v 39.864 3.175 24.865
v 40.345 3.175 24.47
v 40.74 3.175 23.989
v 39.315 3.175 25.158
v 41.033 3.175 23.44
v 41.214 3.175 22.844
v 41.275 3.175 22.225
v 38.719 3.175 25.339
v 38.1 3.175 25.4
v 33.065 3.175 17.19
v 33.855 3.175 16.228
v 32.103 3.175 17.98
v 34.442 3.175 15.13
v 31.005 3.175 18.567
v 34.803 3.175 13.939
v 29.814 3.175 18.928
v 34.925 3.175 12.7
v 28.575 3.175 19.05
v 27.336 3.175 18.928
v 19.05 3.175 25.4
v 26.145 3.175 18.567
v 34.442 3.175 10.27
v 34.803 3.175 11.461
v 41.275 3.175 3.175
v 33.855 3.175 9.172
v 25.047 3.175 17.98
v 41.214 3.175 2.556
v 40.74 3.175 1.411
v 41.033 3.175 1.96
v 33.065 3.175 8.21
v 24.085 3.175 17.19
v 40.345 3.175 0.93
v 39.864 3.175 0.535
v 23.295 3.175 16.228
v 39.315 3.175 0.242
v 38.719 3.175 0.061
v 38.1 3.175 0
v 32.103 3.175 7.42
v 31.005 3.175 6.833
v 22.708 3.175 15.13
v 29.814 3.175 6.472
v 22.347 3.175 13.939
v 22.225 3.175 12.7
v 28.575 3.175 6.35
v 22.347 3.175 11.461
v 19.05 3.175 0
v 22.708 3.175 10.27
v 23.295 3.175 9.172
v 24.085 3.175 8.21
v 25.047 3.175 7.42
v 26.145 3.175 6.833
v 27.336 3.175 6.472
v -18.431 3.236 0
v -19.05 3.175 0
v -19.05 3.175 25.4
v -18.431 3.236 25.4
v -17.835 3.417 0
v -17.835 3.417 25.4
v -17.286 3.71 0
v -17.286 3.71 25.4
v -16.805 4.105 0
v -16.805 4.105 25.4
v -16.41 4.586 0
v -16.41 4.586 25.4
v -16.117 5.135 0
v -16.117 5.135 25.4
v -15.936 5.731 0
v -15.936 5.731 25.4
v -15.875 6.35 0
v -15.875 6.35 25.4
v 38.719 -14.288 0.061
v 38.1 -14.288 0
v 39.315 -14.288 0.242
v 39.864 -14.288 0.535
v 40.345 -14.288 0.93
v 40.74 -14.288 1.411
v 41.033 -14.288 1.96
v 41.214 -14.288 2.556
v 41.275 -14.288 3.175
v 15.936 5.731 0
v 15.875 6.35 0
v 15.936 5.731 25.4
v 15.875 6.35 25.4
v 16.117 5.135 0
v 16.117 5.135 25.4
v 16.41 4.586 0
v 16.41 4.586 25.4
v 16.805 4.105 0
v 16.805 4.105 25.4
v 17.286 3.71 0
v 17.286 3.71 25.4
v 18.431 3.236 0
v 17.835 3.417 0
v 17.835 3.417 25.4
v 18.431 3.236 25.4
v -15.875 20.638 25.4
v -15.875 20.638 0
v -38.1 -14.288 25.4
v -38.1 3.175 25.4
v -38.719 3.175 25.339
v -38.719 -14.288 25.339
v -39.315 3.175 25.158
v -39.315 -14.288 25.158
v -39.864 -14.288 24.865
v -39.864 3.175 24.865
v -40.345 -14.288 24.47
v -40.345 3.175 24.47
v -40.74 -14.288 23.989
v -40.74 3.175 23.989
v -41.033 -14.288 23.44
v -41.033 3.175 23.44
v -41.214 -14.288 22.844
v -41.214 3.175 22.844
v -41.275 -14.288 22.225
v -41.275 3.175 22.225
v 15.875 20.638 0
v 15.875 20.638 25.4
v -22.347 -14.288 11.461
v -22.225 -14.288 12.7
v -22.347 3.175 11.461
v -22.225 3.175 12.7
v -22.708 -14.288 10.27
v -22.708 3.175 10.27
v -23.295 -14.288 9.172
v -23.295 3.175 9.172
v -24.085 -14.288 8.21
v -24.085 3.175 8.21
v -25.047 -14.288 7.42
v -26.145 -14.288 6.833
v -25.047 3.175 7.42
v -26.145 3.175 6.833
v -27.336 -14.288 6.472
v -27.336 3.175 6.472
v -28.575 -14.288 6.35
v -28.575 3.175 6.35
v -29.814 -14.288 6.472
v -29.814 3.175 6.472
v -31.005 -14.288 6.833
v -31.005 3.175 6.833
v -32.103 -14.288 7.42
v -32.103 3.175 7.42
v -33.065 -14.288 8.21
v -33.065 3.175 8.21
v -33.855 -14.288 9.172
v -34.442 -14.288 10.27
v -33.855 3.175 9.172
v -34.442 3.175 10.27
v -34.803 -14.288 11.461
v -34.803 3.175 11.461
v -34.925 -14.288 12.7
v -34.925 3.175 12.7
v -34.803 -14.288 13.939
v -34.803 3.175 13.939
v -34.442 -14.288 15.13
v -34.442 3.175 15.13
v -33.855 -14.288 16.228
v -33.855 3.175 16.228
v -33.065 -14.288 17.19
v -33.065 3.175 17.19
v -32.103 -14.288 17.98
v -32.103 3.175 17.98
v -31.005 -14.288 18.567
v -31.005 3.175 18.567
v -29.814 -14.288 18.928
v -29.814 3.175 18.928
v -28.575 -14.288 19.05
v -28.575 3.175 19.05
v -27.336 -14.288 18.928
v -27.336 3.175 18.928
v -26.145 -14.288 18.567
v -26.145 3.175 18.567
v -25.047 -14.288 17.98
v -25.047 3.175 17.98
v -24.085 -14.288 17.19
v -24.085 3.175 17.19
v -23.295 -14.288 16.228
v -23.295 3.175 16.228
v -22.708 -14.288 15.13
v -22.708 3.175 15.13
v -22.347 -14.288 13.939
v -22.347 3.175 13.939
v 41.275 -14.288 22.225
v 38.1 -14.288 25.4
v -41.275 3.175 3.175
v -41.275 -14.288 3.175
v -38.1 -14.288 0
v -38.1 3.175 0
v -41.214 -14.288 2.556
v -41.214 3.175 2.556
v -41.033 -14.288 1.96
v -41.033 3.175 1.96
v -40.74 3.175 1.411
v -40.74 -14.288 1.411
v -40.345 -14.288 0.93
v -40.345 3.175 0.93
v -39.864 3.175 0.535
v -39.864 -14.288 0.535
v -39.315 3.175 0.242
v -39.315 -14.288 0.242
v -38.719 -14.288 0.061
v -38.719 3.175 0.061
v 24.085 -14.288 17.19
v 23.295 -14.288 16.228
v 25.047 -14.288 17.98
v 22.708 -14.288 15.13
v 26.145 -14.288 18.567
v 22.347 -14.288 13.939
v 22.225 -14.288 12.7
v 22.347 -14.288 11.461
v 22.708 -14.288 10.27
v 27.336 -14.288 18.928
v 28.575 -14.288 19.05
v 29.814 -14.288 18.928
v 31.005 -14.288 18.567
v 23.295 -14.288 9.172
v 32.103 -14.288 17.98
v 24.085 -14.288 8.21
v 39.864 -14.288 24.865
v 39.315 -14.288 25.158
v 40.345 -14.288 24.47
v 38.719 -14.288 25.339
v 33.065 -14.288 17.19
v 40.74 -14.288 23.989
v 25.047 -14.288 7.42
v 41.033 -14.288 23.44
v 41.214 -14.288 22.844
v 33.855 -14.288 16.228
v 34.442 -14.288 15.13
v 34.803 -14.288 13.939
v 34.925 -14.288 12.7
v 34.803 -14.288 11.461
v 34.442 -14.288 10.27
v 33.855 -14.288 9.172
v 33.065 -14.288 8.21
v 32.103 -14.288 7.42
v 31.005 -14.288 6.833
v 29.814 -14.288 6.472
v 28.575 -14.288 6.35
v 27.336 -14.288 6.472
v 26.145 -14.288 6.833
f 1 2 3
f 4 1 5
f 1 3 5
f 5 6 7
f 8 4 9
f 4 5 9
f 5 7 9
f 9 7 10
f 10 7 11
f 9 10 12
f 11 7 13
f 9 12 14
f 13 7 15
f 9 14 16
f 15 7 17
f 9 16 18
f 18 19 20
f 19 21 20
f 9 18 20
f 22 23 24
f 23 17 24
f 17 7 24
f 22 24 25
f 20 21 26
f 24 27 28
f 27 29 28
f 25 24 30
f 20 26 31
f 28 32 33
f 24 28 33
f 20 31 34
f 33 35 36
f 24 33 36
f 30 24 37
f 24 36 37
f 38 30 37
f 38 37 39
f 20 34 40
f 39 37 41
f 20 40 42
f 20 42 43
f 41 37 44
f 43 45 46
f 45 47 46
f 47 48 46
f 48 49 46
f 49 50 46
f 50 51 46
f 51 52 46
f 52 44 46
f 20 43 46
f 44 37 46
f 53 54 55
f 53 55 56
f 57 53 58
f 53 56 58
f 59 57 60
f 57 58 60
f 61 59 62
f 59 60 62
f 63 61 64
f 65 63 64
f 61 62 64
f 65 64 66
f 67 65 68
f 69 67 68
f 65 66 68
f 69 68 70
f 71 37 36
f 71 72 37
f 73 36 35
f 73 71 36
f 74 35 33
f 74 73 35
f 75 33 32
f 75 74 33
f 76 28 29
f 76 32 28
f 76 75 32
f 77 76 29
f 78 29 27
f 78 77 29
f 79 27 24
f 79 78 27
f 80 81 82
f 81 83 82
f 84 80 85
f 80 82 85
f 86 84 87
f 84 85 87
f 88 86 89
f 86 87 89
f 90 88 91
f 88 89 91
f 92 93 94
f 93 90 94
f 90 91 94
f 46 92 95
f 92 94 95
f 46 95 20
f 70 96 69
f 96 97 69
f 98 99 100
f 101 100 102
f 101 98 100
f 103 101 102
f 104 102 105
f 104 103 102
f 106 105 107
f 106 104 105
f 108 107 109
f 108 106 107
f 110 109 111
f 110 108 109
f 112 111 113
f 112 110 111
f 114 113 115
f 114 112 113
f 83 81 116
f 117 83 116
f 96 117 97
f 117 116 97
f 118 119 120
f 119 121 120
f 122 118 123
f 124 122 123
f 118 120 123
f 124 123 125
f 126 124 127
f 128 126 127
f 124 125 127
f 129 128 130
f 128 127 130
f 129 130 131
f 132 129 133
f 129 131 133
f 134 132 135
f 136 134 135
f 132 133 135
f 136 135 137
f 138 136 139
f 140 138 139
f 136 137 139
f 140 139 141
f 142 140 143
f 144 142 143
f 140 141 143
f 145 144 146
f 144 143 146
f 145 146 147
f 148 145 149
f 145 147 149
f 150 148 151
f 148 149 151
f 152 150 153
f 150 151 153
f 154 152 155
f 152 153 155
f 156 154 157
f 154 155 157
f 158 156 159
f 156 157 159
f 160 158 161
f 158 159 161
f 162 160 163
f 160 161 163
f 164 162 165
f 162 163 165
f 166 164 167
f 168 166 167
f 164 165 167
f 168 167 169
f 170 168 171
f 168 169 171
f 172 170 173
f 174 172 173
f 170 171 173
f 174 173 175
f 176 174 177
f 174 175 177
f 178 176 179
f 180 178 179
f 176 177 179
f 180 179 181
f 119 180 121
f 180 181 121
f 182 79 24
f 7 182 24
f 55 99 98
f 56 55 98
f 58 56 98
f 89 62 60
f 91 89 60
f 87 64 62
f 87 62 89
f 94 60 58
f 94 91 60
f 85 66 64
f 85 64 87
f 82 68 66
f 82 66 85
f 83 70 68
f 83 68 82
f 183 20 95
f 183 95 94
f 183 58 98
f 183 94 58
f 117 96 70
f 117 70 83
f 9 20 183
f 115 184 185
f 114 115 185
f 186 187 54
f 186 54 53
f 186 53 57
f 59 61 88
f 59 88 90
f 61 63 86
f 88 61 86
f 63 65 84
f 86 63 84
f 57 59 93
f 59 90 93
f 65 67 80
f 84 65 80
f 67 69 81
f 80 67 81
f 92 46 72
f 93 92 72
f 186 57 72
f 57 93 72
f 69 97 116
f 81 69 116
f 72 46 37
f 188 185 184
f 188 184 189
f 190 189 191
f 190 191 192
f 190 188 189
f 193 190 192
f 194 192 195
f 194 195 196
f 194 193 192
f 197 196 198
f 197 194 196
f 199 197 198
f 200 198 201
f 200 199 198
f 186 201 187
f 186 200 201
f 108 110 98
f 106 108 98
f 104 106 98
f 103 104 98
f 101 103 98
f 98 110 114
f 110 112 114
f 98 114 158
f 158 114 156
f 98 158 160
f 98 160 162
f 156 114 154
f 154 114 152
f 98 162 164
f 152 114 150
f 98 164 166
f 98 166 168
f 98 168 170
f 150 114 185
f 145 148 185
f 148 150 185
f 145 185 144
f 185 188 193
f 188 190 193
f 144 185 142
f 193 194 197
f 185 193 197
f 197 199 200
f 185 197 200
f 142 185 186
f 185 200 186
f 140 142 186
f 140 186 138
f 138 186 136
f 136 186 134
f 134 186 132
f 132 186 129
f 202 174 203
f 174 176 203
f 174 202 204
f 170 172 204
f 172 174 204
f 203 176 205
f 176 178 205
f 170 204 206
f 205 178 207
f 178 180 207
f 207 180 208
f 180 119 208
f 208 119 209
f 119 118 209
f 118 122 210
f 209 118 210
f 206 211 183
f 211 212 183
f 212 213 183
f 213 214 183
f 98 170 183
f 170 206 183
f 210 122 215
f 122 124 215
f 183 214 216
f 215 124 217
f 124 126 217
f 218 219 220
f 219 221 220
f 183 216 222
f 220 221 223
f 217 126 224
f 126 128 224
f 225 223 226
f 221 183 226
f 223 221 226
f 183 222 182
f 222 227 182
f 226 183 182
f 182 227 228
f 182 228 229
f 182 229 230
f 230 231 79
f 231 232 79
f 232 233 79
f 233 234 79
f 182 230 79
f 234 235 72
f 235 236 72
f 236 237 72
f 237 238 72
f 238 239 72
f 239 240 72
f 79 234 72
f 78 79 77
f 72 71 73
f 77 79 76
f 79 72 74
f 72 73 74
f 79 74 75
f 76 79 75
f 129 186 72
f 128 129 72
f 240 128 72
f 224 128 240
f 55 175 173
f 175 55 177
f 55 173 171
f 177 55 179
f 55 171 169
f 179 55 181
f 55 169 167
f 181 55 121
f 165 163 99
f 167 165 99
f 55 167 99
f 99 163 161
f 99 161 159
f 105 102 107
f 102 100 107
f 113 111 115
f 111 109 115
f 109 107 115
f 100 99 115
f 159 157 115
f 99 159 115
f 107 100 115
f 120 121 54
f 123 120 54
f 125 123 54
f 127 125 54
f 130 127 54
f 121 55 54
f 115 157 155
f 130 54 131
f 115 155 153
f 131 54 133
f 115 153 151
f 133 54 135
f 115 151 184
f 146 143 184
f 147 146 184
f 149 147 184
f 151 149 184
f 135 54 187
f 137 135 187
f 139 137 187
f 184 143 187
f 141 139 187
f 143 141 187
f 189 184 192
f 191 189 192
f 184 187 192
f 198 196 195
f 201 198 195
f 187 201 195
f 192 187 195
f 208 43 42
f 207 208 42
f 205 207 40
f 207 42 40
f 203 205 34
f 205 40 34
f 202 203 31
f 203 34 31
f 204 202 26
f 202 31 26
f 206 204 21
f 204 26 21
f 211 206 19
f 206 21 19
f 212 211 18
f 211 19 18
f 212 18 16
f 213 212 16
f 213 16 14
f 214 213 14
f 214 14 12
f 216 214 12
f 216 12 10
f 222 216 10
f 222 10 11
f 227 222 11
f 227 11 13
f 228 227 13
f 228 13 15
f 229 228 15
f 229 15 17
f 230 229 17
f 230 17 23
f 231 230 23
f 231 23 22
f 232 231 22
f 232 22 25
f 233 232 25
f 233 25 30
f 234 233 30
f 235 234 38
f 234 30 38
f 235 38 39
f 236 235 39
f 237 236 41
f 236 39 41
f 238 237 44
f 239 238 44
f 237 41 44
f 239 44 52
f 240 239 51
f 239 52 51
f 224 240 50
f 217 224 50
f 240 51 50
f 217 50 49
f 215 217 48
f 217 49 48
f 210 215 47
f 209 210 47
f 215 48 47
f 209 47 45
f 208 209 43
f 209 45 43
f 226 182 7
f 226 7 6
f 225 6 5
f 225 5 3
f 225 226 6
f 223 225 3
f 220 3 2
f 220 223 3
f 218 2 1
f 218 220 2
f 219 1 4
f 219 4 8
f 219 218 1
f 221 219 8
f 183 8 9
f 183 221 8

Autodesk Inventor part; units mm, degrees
ref_plane "YZ Plane" through (0, 0, 0) normal (1, 0, 0) x (0, 1, 0)
ref_plane "XZ Plane" through (0, 0, 0) normal (0, 1, 0) x (-1, 0, 0)
ref_plane "XY Plane" through (0, 0, 0) normal (0, 0, 1) x (1, 0, 0)
sketch "Sketch1" plane through (0, 0, 0) normal (0, 0, 1) x (1, 0, 0)
  line L0 (0, -14.2875) -> (0, 20.6375)
  line L1 (0, 20.6375) -> (-15.875, 20.6375)
  line L2 (-15.875, 20.6375) -> (-15.875, 3.175)
  line L3 (-15.875, 3.175) -> (-41.275, 3.175)
  line L4 (-41.275, 3.175) -> (-41.275, -14.2875)
  line L5 (-41.275, -14.2875) -> (0, -14.2875)
extrude "Extrusion1" add sketch "Sketch1" along normal blind 25.4
sketch "Sketch2" plane through (-41.275, 3.175, 0) normal (0, 1, 0) x (1, 0, 0)
  circle A0 centre (12.7, -12.7) radius 6.35
extrude "Extrusion2" cut sketch "Sketch2" against normal through all
fillet "Fillet1" radius 3.175 3 edges at (-41.275, -5.5563, 25.4) (-41.275, -5.5563, 0) (-15.875, 3.175, 12.7)
mirror "Mirror1" about plane through (0, 20.6375, 0) normal (1, 0, 0) of "Extrusion1", "Extrusion2", "Fillet1"
properties part number "Left half"
